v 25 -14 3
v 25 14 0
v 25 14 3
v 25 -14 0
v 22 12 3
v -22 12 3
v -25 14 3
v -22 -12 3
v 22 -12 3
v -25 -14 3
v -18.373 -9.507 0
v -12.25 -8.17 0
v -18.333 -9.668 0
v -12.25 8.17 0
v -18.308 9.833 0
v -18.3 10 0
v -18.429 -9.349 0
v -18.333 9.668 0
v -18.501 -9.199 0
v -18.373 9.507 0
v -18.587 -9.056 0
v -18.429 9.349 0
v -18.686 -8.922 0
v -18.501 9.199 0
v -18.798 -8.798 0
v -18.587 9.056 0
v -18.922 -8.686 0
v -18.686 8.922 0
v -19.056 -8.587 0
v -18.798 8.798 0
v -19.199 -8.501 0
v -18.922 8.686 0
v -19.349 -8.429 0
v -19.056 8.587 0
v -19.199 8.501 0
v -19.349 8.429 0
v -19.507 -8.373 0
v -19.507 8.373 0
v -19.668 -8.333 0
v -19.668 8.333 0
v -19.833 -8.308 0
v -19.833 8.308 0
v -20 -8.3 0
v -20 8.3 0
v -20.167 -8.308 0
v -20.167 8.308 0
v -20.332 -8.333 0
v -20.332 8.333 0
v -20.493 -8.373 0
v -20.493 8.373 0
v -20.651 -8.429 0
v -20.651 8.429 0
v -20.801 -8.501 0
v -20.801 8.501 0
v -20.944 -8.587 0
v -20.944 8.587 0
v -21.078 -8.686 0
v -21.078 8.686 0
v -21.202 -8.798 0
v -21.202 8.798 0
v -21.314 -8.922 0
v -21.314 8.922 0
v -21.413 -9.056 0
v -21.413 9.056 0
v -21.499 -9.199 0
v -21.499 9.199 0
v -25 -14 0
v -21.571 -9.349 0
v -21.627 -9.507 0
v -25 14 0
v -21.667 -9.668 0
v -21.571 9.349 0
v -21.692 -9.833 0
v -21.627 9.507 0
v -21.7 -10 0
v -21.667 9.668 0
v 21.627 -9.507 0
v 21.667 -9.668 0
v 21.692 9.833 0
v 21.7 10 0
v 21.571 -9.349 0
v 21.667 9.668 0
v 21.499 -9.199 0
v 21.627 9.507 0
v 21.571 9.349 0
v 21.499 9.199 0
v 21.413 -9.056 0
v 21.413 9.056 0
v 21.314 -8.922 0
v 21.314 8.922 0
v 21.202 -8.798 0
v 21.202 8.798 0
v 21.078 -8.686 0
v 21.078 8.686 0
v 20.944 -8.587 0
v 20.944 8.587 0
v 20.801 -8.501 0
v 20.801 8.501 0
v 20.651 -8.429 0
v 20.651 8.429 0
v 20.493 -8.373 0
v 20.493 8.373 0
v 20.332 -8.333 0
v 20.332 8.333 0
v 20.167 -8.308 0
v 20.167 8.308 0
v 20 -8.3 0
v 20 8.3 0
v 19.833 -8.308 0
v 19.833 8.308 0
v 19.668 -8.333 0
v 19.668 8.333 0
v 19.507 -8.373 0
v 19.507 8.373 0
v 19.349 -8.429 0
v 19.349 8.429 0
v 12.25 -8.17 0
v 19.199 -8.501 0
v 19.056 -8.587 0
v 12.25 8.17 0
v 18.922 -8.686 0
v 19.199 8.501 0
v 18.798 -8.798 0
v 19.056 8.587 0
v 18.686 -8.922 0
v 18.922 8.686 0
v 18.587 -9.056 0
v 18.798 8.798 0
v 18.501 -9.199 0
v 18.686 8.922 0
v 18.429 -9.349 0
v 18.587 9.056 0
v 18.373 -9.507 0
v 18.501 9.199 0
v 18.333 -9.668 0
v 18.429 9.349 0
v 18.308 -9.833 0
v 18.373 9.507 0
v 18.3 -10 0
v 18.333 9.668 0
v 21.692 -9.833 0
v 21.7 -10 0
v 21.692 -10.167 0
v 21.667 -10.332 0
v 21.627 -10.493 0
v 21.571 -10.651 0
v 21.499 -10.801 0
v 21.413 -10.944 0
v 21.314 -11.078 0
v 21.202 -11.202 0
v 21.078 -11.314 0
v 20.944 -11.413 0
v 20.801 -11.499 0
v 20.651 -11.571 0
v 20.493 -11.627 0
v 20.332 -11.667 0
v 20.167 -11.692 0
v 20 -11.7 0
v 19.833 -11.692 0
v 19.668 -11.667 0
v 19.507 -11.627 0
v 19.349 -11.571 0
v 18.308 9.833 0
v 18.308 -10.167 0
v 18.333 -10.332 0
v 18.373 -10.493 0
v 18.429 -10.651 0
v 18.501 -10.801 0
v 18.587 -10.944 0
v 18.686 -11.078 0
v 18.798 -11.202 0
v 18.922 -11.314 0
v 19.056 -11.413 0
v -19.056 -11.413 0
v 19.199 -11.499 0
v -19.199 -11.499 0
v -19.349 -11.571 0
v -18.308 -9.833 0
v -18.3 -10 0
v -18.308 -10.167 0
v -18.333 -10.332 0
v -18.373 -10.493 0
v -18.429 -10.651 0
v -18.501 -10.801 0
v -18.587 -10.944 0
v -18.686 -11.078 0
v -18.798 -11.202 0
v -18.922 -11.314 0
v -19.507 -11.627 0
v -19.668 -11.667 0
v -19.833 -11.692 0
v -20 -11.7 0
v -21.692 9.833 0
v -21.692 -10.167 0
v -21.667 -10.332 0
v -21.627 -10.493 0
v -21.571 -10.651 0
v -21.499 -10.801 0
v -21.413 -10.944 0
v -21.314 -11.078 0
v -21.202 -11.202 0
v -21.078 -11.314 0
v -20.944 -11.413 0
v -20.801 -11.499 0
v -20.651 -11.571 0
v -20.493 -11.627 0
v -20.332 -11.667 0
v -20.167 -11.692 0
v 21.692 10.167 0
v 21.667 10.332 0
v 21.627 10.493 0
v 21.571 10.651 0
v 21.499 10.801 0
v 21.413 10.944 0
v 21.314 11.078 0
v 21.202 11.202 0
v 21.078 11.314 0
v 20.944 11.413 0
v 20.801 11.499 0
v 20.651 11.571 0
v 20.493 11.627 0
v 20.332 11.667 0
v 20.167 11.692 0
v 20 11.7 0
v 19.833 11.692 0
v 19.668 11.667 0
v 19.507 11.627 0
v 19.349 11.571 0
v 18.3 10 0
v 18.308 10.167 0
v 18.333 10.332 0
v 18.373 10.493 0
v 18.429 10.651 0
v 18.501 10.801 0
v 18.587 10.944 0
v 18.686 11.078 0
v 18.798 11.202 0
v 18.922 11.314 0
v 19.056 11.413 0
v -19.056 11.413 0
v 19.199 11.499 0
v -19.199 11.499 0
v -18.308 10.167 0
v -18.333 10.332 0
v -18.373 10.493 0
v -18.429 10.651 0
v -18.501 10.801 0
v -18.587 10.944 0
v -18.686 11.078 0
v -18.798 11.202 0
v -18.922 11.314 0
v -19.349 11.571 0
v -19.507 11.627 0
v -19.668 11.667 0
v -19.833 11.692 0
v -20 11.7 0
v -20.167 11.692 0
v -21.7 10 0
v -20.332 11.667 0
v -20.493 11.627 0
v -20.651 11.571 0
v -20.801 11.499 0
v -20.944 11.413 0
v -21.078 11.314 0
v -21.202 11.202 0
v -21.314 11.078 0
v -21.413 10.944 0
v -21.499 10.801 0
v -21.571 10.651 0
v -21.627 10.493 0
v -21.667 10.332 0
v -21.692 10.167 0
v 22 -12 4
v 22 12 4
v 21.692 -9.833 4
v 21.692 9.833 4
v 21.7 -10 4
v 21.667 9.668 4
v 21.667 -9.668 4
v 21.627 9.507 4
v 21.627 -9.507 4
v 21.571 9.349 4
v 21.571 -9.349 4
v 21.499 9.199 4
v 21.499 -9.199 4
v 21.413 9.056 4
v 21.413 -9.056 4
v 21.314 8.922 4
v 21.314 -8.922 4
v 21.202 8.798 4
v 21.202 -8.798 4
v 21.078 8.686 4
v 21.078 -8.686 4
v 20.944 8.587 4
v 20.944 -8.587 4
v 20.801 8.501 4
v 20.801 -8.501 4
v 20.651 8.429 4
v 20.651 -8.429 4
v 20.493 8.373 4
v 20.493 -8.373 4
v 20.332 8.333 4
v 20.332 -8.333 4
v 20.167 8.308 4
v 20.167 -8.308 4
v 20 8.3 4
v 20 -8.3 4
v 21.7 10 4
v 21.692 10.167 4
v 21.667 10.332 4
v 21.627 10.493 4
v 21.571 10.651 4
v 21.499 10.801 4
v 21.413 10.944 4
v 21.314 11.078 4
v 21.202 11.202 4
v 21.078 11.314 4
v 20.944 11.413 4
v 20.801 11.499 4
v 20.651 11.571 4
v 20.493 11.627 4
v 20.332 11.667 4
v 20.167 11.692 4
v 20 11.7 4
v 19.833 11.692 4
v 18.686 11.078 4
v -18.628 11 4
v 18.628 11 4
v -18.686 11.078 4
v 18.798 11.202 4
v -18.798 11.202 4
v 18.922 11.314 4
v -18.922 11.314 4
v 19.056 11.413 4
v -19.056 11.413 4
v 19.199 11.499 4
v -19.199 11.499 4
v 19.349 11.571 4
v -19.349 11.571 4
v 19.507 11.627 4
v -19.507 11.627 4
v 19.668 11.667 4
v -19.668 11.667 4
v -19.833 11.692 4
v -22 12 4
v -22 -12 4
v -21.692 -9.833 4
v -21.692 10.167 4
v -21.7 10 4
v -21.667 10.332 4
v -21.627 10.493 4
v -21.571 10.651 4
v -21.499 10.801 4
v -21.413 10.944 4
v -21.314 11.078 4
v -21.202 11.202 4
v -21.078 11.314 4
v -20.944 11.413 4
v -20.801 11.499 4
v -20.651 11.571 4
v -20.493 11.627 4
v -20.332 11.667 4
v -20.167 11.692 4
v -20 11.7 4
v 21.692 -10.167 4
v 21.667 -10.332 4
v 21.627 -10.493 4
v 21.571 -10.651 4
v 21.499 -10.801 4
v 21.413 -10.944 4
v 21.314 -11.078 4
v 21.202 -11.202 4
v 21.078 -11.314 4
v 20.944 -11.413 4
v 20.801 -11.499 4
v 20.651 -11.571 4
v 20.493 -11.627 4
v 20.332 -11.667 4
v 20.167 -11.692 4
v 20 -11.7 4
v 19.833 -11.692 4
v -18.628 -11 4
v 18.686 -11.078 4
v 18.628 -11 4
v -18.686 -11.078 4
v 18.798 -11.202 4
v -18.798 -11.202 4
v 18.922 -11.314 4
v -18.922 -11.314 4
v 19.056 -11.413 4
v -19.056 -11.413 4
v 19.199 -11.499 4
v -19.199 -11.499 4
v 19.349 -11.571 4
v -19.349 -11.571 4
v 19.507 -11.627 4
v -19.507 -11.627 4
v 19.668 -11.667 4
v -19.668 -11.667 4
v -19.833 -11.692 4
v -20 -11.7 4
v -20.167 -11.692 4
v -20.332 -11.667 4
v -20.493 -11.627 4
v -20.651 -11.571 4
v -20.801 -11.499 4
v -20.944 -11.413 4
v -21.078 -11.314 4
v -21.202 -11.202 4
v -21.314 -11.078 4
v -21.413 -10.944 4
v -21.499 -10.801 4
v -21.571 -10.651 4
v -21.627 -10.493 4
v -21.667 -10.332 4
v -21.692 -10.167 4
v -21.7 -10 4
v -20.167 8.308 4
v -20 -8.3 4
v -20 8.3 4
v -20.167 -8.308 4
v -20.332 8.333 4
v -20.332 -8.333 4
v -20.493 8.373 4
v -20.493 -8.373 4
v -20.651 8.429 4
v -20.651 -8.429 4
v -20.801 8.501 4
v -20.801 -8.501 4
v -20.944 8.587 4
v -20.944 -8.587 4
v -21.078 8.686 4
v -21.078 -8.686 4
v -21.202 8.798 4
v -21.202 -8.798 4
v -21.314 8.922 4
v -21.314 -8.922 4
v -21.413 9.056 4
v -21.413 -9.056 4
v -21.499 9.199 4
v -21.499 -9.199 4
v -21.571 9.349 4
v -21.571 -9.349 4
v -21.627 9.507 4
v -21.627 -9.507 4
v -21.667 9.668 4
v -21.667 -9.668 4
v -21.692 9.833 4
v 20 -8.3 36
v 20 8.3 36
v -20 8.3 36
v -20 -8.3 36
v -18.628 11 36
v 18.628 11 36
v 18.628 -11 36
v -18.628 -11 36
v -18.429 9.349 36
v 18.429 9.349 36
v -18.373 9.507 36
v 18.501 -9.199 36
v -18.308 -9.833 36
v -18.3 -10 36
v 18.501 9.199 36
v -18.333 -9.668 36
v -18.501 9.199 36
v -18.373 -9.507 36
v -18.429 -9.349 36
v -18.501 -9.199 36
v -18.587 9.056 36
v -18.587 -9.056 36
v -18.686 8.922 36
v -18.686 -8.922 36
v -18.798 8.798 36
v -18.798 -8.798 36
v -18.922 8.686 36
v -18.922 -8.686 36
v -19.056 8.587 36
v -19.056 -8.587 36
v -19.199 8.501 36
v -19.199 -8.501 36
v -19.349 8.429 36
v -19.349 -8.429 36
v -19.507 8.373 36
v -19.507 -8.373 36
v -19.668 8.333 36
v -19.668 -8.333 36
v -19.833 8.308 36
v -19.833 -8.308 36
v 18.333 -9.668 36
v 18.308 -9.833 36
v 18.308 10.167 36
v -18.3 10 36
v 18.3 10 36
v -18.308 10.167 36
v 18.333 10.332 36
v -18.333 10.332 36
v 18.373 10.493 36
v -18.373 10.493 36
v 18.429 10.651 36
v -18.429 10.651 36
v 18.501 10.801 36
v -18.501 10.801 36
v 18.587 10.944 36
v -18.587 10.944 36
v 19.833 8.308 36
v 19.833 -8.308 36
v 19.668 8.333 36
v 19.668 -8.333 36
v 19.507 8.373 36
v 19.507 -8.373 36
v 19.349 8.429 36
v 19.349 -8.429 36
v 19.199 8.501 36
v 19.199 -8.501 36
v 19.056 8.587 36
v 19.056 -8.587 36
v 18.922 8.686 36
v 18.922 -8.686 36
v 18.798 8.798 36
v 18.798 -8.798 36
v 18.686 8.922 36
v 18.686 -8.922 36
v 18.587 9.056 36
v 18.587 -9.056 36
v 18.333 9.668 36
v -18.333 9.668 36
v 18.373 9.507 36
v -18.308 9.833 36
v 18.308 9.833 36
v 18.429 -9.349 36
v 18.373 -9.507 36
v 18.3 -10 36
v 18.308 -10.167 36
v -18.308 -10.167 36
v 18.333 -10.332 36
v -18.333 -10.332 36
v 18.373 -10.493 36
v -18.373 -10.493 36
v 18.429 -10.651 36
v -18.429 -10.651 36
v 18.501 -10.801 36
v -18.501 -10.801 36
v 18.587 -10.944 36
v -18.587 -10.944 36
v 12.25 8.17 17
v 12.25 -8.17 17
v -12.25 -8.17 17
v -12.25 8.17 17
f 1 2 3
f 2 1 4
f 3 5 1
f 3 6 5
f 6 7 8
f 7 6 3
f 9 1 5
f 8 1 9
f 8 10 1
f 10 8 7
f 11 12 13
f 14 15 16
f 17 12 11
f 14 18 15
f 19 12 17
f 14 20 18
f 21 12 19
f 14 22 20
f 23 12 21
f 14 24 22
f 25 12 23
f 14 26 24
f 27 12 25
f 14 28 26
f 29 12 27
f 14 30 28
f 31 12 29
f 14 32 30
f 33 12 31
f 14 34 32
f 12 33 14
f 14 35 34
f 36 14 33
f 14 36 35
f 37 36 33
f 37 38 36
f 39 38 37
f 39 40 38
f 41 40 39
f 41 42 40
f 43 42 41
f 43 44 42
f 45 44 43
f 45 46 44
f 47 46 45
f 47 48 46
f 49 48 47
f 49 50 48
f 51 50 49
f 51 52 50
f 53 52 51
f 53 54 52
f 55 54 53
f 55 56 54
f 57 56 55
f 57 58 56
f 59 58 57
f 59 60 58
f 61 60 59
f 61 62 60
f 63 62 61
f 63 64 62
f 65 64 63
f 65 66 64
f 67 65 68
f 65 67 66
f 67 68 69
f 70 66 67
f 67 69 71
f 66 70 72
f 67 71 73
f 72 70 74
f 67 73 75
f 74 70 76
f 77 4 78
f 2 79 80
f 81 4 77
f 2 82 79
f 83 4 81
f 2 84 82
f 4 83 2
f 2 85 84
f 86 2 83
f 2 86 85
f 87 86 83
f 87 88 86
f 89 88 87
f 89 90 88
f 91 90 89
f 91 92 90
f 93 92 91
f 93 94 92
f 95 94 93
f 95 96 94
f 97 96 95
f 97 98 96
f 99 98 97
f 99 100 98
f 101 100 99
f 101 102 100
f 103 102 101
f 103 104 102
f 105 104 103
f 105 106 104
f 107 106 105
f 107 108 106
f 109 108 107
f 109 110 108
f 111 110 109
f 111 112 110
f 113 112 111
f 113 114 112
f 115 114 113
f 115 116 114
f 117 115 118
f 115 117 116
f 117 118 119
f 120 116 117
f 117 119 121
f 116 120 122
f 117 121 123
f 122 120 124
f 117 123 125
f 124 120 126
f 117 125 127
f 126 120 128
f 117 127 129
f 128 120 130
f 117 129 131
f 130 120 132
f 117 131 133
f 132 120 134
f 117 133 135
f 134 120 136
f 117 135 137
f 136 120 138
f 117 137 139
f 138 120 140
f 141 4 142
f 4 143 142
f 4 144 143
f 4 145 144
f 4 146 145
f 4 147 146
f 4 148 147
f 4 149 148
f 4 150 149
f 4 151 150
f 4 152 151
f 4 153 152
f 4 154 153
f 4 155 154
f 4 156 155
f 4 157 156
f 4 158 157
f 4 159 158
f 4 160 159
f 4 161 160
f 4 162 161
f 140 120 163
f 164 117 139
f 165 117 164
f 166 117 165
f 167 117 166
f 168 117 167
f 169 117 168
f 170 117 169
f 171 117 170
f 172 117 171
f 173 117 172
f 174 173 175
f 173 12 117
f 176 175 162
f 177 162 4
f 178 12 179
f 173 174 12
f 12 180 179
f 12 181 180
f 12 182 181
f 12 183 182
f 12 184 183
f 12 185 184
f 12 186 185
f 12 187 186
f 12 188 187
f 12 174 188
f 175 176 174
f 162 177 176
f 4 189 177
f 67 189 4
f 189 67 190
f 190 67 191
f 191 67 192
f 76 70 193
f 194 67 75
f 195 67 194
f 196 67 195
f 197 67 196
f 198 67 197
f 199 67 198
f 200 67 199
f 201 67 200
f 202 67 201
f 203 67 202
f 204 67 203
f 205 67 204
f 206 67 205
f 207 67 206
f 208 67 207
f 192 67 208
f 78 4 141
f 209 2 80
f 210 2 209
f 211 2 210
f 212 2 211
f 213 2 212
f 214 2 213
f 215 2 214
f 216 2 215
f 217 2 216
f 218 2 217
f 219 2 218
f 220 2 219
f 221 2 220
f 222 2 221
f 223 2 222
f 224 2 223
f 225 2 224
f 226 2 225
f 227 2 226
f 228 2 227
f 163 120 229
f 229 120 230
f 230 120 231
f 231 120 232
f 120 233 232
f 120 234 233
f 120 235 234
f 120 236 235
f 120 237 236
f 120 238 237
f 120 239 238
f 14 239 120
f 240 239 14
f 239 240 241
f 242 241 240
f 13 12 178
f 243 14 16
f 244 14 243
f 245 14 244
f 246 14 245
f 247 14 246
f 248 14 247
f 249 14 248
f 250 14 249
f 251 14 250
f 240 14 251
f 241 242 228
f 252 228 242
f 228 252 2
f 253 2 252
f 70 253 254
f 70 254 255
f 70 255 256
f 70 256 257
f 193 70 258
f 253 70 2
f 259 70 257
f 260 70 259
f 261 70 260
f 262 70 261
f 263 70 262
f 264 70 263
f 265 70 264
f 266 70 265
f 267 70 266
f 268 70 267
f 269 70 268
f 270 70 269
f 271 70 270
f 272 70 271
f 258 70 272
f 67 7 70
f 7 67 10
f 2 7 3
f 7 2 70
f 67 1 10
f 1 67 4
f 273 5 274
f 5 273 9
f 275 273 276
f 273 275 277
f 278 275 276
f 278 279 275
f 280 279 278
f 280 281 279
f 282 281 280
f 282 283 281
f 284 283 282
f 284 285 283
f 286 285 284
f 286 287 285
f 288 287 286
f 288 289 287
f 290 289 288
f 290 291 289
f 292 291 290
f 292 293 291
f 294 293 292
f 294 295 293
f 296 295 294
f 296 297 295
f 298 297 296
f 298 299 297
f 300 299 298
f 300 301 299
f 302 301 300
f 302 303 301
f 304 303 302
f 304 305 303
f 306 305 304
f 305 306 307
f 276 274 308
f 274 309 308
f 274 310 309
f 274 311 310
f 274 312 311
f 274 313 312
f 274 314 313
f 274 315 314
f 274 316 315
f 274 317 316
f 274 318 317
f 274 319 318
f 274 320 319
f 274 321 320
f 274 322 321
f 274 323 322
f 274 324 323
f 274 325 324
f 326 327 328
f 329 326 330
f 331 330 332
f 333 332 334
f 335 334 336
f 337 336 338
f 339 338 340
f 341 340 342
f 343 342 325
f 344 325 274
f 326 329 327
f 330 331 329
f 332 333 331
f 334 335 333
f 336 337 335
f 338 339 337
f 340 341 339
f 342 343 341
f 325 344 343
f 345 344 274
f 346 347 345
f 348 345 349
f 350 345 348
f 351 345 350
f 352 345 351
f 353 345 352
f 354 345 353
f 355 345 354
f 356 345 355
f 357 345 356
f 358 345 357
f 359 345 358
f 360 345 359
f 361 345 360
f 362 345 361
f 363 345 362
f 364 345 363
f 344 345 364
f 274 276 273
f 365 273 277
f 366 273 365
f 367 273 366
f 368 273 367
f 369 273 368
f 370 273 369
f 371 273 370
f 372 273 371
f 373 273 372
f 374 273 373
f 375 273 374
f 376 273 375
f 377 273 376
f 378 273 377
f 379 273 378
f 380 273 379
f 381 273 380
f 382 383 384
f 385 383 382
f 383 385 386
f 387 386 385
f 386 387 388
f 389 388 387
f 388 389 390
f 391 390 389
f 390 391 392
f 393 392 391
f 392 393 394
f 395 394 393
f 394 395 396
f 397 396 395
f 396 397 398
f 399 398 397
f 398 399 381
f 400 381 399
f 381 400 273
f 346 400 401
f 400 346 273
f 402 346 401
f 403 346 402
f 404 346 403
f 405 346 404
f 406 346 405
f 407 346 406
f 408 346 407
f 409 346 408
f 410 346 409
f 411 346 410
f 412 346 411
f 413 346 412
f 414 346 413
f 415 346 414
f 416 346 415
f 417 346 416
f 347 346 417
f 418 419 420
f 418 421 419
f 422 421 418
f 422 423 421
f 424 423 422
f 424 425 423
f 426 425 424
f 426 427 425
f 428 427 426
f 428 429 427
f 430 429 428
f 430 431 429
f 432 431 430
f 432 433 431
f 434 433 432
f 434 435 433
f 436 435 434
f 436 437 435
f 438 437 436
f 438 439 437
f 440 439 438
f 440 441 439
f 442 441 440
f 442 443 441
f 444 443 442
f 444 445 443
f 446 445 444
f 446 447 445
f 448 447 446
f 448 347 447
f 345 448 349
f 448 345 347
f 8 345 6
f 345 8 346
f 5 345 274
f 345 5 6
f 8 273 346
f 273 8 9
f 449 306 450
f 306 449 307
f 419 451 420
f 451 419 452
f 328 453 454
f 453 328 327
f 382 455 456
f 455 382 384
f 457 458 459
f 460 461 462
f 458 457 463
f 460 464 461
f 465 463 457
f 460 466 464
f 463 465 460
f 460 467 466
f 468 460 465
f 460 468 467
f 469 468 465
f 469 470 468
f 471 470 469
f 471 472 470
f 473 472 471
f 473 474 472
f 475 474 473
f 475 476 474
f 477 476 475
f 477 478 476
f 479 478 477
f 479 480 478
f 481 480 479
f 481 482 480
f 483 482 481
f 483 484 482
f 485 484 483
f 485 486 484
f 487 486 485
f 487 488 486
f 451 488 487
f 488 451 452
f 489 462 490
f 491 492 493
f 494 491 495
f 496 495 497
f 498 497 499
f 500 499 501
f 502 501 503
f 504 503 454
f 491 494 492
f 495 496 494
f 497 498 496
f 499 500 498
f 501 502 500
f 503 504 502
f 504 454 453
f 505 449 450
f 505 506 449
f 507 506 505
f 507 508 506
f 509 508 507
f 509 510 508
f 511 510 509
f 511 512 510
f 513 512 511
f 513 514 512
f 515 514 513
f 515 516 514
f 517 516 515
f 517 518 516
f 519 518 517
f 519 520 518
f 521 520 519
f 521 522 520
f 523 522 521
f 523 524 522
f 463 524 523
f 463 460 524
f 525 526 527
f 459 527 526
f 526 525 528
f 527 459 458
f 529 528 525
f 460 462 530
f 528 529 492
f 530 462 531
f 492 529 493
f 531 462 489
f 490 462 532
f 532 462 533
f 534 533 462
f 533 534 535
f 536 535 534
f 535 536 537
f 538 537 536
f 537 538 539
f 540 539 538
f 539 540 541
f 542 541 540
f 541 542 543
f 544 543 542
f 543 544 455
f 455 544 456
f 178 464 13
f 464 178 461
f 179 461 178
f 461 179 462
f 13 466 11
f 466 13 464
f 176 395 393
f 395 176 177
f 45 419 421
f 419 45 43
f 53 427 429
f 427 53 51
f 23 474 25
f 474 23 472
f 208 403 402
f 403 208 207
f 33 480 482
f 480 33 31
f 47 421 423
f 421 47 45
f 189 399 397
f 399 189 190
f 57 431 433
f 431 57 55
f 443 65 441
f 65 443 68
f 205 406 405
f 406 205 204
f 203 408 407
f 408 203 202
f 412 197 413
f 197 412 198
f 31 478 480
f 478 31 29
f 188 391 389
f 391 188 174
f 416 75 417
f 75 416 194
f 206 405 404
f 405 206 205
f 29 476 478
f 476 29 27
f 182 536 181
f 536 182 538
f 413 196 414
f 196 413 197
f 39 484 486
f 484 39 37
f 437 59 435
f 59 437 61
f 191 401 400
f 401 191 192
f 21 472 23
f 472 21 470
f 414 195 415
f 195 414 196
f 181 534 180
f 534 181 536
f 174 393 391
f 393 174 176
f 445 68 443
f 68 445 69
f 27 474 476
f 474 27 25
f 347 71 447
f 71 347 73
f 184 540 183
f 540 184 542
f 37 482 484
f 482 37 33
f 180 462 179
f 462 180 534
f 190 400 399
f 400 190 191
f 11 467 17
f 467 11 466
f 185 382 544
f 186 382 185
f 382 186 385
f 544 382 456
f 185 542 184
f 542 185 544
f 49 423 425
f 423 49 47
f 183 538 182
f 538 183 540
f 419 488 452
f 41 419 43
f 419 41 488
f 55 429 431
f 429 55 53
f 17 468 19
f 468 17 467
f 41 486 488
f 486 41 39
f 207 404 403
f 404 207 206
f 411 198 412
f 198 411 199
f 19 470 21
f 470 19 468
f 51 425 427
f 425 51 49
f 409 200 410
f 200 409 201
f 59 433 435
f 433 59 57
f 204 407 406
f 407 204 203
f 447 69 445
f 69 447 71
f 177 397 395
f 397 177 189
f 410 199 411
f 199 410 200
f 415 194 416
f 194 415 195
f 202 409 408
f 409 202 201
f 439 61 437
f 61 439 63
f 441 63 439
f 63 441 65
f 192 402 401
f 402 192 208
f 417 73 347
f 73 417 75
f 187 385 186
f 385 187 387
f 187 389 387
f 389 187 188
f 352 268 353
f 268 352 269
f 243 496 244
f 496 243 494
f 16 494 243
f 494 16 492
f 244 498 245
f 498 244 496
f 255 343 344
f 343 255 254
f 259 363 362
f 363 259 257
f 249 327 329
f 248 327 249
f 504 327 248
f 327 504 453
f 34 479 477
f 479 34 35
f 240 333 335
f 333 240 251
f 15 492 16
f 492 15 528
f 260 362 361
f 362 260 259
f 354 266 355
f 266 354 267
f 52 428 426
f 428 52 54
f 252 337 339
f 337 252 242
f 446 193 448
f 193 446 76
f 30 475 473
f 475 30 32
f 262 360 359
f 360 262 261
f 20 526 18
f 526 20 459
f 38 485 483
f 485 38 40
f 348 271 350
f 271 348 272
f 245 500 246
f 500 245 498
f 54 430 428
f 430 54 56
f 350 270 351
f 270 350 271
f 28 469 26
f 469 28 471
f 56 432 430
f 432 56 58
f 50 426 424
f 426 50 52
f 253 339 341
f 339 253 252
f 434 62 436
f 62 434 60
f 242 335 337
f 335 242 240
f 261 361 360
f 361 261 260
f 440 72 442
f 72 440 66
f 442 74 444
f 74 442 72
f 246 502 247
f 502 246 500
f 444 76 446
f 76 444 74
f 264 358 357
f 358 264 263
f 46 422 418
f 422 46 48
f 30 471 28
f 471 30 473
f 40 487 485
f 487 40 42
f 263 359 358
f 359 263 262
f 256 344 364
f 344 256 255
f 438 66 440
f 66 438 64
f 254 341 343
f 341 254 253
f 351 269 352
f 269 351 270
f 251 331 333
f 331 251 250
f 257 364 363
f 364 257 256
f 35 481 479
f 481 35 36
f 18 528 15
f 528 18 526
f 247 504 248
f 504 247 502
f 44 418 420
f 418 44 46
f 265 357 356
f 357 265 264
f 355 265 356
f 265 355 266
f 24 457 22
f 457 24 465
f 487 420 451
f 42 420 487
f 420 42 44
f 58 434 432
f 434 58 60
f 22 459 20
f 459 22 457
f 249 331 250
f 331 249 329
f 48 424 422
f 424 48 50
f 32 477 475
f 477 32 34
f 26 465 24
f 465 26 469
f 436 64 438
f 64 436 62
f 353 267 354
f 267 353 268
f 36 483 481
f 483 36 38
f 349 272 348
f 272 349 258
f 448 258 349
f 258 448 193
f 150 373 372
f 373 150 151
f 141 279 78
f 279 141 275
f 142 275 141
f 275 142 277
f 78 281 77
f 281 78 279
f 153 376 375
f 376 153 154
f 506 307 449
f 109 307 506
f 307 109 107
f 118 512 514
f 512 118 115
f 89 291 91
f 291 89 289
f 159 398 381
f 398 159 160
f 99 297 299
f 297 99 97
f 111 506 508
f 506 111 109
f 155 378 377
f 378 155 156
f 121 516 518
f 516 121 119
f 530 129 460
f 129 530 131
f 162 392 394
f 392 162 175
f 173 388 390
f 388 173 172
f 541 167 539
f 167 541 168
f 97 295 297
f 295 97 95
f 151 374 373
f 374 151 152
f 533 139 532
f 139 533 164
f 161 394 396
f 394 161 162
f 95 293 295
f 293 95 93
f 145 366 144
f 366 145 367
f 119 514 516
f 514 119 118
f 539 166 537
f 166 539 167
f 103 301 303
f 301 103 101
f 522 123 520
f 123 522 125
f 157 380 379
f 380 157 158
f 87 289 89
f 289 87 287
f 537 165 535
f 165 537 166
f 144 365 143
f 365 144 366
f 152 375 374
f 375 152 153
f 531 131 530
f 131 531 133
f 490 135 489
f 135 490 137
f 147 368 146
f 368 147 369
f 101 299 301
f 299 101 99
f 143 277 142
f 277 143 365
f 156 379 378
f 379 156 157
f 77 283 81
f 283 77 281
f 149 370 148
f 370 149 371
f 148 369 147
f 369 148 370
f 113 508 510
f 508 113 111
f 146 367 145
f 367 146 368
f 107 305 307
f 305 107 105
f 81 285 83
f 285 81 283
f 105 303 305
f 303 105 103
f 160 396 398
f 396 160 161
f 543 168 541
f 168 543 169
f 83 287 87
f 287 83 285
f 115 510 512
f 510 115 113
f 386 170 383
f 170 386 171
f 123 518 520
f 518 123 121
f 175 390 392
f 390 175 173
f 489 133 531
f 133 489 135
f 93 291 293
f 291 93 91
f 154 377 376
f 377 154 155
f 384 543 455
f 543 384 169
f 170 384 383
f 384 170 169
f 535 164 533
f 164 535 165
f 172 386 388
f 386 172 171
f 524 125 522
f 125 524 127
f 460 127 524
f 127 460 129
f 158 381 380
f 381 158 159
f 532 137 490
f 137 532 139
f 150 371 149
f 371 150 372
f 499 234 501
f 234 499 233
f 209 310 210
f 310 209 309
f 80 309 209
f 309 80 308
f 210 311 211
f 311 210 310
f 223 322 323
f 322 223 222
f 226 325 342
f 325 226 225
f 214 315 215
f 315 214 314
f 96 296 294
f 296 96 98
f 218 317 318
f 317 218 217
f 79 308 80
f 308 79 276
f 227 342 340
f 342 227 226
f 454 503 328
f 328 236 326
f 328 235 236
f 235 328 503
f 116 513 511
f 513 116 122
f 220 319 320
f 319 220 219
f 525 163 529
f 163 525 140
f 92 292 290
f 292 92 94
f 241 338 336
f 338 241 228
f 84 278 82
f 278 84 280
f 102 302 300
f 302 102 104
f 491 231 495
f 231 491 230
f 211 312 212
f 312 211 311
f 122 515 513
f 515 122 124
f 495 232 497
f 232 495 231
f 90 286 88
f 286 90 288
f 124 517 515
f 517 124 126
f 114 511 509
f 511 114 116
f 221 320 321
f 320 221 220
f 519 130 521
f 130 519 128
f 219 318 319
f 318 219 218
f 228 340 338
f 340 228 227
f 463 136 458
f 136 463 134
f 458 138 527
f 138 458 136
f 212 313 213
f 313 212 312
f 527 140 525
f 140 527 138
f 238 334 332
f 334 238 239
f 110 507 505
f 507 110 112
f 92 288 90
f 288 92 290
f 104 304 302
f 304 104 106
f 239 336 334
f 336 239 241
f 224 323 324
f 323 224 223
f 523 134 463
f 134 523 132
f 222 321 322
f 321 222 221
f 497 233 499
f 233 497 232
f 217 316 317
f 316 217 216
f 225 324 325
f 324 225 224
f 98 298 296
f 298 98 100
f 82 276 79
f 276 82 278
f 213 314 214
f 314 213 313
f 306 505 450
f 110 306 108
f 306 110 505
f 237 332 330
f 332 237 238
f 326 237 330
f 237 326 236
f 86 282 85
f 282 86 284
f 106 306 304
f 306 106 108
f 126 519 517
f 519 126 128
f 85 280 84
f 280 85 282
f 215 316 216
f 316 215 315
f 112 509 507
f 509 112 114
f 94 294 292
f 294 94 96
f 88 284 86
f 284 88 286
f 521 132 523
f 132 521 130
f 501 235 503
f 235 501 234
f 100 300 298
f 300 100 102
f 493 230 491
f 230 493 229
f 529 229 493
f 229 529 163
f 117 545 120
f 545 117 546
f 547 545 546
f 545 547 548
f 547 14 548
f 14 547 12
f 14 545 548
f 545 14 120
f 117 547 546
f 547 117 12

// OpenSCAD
// Parameters
component_type = 0; //[0:0:1]
orientation = 0; //[0:0:1]
origin_x = 0; //[-100:100:1]
origin_y = 0; //[-100:100:1]
origin_z = 0; //[-100:100:1]
overlap = 1; //[0.5:2:0.1]
flange_w = 50; //[25:100:1]
flange_h = 28; //[14:56:1]
flange_t = 3; //[1.5:6:0.5]
bezel_w = 44; //[22:88:1]
bezel_h = 24; //[12:48:1]
bezel_t = 2; //[1:4:0.5]
body_w = 40; //[20:80:1]
body_h = 22; //[11:44:1]
body_depth_front = 14; //[7:28:1]
body_depth_rear = 18; //[9:36:1]
socket_w = 24.5; //[12.25:49:0.1]
socket_h = 16.34; //[8.17:32.68:0.01]
socket_depth = 17; //[8.5:34:1]
socket_offset_y = 0; //[-5:5:0.5]
screw_pitch_x = 40; //[20:80:1]
screw_pitch_y = 20; //[10:40:1]
screw_clear_r = 1.7; //[0.85:3.4:0.05]
countersink_r = 3.2; //[1.6:6.4:0.1]
countersink_h = 2; //[1:4:0.5]
pin_w = 2; //[1:4:0.1]
pin_d = 4; //[2:8:0.1]
pin_h_short = 12; //[6:24:1]
pin_h_long = 15; //[7.5:30:1]
pin_spacing_x = 7; //[3.5:14:0.5]
pin_offset_y = -2; //[-6:6:0.5]
pin_center_offset_y = 2; //[-6:6:0.5]

$fn = 64;

// IEC Connector - lugless, one connected solid
module iec() {
  // Build along Z with flange FRONT face at z=0, body extends to +Z
  z_flange_c = flange_t/2;
  z_bezel_c  = flange_t + bezel_t/2 - overlap;
  z_front_c  = flange_t + bezel_t + body_depth_front/2 - overlap;
  z_rear_c   = flange_t + bezel_t + body_depth_front + body_depth_rear/2 - overlap;

  total_depth = flange_t + bezel_t + body_depth_front + body_depth_rear;

  translate([origin_x, origin_y, origin_z])
  difference() {
    // ONE connected solid: union of all positive geometry
    union() {
      // Flange
      translate([0, 0, z_flange_c])
        cube([flange_w, flange_h, flange_t], center=true);

      // Bezel (overlaps into flange)
      translate([0, 0, z_bezel_c])
        cube([bezel_w, bezel_h, bezel_t], center=true);

      // Front body (overlaps into bezel)
      translate([0, 0, z_front_c])
        cube([body_w, body_h, body_depth_front], center=true);

      // Rear body (overlaps into front body)
      translate([0, 0, z_rear_c])
        cube([body_w, body_h, body_depth_rear], center=true);

      // Pins: ensure they are embedded into rear body (not floating)
      // Place pin centers slightly INSIDE the rear body's back face by 'overlap'
      z_pin_long_c  = z_rear_c + (body_depth_rear/2) - (pin_h_long/2) - overlap;
      z_pin_short_c = z_rear_c + (body_depth_rear/2) - (pin_h_short/2) - overlap;

      translate([0, socket_offset_y + pin_center_offset_y, z_pin_long_c])
        cube([pin_w, pin_d, pin_h_long], center=true);

      for (x = [-pin_spacing_x, pin_spacing_x])
        translate([x, socket_offset_y + pin_offset_y, z_pin_short_c])
          cube([pin_w, pin_d, pin_h_short], center=true);
    }

    // Socket opening: cut from FRONT face (z=0) into the body (+Z)
    // Centered so its front face is at z=0 (with a small overlap to avoid coplanar issues)
    translate([0, socket_offset_y, socket_depth/2 - overlap])
      cube([socket_w, socket_h, socket_depth + 2*overlap], center=true);

    // Screw clearance holes + countersinks
    for (x = [-screw_pitch_x/2, screw_pitch_x/2])
      for (y = [-screw_pitch_y/2, screw_pitch_y/2]) {
        // Through hole along Z, spanning entire part depth
        translate([x, y, total_depth/2 - overlap])
          cylinder(r=screw_clear_r, h=total_depth + 4*overlap, center=true);

        // Countersink from front side (within flange thickness)
        translate([x, y, countersink_h/2 - overlap])
          cylinder(r1=countersink_r, r2=0, h=countersink_h + 2*overlap, center=true);
      }
  }
}

// Assembly
module assembly() {
  iec();
}

assembly();
